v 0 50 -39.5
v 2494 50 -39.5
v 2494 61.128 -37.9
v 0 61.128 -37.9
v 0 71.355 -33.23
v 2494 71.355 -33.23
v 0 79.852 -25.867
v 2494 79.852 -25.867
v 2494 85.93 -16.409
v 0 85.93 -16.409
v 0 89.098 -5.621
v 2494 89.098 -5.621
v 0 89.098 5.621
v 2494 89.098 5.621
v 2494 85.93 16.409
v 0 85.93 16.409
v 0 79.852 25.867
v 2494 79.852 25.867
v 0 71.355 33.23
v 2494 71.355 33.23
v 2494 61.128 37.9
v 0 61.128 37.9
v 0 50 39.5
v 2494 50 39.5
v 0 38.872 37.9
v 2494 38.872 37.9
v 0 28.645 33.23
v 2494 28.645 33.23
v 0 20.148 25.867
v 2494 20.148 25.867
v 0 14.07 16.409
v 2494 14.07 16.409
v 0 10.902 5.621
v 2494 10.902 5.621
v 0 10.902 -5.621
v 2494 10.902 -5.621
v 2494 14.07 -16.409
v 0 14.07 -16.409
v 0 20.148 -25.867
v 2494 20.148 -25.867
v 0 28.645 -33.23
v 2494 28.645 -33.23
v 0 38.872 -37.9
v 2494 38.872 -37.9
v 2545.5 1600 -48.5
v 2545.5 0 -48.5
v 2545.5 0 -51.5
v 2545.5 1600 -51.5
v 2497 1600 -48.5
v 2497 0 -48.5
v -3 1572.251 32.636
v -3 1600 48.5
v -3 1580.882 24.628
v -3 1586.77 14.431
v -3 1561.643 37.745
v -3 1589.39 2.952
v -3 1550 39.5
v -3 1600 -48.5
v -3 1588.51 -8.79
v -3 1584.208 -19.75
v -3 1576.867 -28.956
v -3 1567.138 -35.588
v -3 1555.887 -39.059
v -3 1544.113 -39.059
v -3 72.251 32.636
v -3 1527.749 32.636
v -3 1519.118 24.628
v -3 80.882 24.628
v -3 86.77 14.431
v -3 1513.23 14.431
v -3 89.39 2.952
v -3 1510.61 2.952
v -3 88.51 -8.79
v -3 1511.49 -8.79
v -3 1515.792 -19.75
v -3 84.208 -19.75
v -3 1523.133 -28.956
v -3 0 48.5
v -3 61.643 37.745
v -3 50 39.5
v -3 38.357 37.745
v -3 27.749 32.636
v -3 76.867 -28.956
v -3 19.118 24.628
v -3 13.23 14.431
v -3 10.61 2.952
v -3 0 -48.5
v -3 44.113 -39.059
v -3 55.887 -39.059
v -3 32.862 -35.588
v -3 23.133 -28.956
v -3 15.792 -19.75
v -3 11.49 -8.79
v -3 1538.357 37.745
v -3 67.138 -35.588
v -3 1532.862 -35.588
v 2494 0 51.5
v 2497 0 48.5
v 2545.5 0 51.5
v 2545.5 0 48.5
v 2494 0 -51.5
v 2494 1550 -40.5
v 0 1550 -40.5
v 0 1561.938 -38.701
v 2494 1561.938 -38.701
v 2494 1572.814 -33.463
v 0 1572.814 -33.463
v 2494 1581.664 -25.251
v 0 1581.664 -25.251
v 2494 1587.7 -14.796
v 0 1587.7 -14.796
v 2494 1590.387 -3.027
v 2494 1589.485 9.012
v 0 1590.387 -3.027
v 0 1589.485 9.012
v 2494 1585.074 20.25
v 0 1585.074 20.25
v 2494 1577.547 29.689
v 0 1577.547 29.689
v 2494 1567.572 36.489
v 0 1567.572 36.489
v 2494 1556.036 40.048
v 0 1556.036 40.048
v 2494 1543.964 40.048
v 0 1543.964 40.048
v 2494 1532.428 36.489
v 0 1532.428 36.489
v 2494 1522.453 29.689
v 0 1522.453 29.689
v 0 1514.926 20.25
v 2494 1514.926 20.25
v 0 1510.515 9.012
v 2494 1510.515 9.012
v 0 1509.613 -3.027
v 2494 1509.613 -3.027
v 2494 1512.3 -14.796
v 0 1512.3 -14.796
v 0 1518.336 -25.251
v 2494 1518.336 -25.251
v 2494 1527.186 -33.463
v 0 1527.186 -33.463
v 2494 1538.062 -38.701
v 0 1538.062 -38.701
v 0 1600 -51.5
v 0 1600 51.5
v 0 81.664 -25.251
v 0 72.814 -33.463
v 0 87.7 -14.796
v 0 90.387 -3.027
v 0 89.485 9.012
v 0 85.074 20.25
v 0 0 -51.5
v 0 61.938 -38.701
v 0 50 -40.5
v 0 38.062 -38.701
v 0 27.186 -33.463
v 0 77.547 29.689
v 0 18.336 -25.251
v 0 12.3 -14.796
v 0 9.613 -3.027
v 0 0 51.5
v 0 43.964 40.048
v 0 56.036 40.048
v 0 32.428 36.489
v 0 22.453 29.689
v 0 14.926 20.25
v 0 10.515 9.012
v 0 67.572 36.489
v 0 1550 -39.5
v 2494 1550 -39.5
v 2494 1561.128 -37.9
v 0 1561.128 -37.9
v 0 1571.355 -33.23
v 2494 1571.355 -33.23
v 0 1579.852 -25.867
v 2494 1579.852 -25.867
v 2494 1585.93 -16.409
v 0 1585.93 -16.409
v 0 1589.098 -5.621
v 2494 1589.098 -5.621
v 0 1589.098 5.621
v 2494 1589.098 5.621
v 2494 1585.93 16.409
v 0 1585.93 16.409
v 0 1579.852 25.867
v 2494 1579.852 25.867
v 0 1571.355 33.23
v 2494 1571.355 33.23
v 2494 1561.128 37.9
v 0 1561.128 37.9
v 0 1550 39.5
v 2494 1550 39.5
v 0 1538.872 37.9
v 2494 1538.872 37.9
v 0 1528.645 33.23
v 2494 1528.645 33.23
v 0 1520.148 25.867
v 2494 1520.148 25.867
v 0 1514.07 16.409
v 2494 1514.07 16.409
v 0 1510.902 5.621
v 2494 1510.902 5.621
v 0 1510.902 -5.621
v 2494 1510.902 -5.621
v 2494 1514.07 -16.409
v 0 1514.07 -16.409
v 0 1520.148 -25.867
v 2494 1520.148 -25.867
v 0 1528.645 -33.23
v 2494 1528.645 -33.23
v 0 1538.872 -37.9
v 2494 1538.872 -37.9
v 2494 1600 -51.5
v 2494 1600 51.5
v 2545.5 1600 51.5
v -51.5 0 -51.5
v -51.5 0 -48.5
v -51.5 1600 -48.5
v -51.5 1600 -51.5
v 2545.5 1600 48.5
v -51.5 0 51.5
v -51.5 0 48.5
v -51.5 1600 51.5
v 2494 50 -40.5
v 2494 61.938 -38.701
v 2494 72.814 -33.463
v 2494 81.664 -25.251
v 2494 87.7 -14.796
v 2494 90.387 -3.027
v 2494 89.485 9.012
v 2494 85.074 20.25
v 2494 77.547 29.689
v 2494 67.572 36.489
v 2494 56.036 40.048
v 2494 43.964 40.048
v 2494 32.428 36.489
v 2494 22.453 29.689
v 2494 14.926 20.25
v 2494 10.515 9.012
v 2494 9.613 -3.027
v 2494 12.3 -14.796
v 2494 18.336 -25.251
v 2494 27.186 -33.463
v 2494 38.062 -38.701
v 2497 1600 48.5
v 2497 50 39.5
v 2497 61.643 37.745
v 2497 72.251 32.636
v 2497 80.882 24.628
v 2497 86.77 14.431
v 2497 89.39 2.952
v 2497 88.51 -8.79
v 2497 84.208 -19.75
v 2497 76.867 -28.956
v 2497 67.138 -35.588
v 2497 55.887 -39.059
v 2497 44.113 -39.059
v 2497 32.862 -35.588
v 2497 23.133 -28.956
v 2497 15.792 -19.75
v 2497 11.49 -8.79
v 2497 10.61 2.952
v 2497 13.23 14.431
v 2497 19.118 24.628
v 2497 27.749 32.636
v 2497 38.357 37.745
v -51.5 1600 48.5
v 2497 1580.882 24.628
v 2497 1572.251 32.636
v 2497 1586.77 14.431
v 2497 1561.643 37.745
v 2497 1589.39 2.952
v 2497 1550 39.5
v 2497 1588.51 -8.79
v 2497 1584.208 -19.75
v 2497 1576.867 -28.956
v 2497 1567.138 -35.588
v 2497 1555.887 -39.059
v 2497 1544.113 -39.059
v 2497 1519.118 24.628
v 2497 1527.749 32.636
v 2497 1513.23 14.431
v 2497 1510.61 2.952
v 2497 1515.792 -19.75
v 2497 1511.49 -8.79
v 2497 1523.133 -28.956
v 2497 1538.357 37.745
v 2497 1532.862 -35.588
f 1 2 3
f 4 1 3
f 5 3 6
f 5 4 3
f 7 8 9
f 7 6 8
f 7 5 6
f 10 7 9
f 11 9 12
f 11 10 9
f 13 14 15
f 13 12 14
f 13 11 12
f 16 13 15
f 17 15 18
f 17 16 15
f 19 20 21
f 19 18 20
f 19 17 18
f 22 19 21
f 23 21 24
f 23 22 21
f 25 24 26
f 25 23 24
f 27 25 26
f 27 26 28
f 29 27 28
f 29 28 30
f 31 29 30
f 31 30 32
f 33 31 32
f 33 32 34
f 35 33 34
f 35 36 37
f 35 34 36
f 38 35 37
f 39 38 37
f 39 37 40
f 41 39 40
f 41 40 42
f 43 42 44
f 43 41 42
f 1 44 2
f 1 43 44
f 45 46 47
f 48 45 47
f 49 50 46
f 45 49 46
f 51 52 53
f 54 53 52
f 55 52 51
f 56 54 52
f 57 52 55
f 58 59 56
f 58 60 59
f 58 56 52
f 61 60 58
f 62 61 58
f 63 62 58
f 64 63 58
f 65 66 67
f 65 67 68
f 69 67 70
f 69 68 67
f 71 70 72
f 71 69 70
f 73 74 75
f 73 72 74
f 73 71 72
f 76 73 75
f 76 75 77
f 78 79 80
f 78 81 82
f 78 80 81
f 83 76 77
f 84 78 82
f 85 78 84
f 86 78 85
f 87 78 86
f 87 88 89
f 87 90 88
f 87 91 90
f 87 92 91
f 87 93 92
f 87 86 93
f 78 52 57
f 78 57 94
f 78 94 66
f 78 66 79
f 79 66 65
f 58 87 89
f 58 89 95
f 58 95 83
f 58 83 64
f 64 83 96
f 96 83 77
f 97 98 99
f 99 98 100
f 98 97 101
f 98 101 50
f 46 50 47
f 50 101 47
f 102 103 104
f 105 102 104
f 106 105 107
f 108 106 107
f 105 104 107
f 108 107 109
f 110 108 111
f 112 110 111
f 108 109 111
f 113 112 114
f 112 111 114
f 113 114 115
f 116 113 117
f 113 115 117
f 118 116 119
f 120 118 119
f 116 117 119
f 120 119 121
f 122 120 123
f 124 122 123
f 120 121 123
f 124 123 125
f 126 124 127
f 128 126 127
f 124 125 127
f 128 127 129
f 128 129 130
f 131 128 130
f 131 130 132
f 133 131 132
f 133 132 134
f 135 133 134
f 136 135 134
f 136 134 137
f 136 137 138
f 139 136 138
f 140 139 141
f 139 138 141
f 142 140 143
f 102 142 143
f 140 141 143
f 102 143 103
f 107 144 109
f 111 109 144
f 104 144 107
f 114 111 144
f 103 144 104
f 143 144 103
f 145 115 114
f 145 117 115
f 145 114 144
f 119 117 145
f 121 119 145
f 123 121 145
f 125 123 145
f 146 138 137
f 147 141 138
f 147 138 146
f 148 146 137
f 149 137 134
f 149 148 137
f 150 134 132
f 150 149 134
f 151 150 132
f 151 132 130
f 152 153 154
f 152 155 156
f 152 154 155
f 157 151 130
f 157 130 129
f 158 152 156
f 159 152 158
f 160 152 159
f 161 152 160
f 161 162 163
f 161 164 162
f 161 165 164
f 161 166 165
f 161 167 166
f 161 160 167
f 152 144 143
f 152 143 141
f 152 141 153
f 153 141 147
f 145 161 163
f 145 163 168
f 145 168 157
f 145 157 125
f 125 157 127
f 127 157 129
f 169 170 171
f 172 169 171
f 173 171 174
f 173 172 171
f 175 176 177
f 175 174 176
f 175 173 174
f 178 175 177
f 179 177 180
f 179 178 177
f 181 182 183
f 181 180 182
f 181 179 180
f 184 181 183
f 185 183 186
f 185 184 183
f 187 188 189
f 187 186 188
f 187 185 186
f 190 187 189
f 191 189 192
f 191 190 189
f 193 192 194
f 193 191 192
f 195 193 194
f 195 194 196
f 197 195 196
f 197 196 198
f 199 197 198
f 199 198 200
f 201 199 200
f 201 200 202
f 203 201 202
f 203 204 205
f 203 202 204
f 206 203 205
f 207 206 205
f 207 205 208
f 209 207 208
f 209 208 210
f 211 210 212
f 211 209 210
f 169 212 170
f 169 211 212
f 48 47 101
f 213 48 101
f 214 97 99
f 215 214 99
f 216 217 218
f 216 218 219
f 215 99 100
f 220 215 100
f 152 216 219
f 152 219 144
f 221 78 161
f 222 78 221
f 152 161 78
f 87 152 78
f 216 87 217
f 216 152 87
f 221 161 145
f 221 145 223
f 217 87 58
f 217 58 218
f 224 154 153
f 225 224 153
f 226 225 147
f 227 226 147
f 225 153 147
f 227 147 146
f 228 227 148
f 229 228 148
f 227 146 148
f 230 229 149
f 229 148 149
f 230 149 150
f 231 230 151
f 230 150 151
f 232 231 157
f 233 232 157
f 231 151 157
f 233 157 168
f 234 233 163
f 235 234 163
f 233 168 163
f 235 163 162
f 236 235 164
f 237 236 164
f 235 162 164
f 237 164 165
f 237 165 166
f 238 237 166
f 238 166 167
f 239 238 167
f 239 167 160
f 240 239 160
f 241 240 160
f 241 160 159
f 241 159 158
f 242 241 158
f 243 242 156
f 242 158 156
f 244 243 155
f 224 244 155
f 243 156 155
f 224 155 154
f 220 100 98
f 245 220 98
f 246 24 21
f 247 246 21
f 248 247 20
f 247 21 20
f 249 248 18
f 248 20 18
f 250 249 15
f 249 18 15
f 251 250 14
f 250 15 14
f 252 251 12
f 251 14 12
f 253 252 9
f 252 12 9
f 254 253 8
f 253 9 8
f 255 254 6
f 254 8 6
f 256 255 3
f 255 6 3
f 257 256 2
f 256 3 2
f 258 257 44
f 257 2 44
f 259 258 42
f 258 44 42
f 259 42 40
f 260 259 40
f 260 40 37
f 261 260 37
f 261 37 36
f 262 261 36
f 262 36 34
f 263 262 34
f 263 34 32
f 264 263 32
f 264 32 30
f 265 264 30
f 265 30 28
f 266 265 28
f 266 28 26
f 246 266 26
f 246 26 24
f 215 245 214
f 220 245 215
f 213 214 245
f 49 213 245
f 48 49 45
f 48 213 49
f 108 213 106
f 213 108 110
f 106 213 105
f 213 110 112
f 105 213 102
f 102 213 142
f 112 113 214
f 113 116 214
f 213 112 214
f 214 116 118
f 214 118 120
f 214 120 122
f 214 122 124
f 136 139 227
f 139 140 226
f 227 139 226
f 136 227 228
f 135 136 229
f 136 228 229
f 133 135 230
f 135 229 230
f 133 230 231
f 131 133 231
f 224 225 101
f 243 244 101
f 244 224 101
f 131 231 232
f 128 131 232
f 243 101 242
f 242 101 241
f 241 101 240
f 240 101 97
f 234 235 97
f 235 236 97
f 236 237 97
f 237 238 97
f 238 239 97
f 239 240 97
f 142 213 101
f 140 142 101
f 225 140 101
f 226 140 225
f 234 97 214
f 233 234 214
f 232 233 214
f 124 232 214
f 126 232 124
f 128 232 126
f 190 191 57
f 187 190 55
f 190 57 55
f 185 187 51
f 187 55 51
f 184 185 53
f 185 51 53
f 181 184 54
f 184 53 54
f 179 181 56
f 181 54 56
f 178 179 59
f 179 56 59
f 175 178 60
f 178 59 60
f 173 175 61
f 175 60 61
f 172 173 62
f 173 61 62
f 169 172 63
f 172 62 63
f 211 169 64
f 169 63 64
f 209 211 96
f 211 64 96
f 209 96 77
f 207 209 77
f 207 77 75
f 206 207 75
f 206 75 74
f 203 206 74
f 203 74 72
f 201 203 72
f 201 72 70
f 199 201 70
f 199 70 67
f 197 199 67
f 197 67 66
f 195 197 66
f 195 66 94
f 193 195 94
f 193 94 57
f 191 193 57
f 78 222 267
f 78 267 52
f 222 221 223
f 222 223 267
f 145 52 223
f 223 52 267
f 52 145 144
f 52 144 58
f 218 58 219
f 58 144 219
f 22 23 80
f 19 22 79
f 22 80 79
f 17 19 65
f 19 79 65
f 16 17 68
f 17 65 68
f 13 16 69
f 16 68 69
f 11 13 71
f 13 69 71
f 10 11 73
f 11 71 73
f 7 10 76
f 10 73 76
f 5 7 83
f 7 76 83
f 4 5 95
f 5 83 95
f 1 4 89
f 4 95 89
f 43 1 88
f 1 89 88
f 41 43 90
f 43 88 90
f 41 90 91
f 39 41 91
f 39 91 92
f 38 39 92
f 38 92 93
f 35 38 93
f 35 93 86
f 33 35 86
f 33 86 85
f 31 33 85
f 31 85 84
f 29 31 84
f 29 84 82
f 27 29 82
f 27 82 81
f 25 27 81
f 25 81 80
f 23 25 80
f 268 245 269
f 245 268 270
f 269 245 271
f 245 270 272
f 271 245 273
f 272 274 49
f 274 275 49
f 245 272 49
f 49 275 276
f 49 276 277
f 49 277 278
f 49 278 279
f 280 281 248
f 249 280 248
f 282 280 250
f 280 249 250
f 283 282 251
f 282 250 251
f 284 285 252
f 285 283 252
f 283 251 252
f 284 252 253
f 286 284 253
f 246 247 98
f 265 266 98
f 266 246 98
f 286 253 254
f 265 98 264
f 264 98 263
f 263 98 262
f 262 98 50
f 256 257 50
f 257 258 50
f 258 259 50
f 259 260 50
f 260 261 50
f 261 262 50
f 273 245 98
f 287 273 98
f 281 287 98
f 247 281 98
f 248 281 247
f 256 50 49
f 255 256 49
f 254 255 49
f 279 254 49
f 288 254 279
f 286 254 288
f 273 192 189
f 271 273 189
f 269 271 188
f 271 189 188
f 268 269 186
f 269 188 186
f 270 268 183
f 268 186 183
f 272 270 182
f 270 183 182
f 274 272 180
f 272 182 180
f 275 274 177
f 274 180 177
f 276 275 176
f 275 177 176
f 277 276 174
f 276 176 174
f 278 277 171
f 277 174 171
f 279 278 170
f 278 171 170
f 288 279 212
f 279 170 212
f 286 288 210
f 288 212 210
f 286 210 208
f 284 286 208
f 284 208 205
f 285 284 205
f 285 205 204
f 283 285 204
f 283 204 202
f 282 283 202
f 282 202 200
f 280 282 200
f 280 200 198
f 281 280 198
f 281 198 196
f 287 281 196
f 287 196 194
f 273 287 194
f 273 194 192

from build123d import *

# Parameters (mm, degrees)
BOSS_EXTRUDE1_DEPTH   = 1600
BOSS_EXTRUDE1_2_DEPTH = 1600
SKETCH7_R             = 39.5
CUT_EXTRUDE2_DEPTH    = 2549.5
SKETCH8_R             = 40.5
SKETCH8_R_2           = 39.5
BOSS_EXTRUDE2_DEPTH   = 2494


with BuildPart() as part:
    # Sketch3 → Boss-Extrude1 (new body)
    with BuildSketch(Plane(origin=(0, 0, 0), x_dir=(1, 0, 0), z_dir=(0, 1, 0))):
        Polygon((-51.5, 51.5), (0, 51.5), (0, -51.5), (-51.5, -51.5), (-51.5, -48.5), (-3, -48.5), (-3, 48.5), (-51.5, 48.5), align=None)
    extrude(amount=BOSS_EXTRUDE1_DEPTH)


with BuildPart() as body_2:
    # Sketch3 → Boss-Extrude1 2 (new body)
    with BuildSketch(Plane(origin=(0, 0, 0), x_dir=(1, 0, 0), z_dir=(0, 1, 0))):
        Polygon((2497, 48.5), (2545.5, 48.5), (2545.5, 51.5), (2494, 51.5), (2494, -51.5), (2545.5, -51.5), (2545.5, -48.5), (2497, -48.5), align=None)
    extrude(amount=BOSS_EXTRUDE1_2_DEPTH)


with BuildPart() as cut_extrude2_tool:
    # Sketch7 → Cut-Extrude2 (new body, through all)
    with BuildSketch(Plane.ZY.offset(3)):
        with Locations((0, 50)):
            Circle(SKETCH7_R)
        with Locations((0, 1550)):
            Circle(SKETCH7_R)
    extrude(amount=-CUT_EXTRUDE2_DEPTH)


with BuildPart() as part_1:
    add(part.part)

    # Cut-Extrude2: cut by cut_extrude2_tool
    add(cut_extrude2_tool.part, mode=Mode.SUBTRACT)



with BuildPart() as body_2_1:
    add(body_2.part)

    # Cut-Extrude2: cut by cut_extrude2_tool
    add(cut_extrude2_tool.part, mode=Mode.SUBTRACT)


with BuildPart() as part_2:
    add(part_1.part)

    add(body_2_1.part)  # Boss-Extrude2 merges body 2
    # Sketch8 → Boss-Extrude2 (add)
    with BuildSketch(Plane(origin=(0, 0, 0), x_dir=(0, 0, -1), z_dir=(1, 0, 0))):
        with Locations((0, 50)):
            Circle(SKETCH8_R)
        with Locations((0, 50)):
            Circle(SKETCH8_R_2, mode=Mode.SUBTRACT)
        with Locations((0, 1550)):
            Circle(SKETCH8_R)
        with Locations((0, 1550)):
            Circle(SKETCH8_R_2, mode=Mode.SUBTRACT)
    extrude(amount=BOSS_EXTRUDE2_DEPTH)


solid = part_2.part
